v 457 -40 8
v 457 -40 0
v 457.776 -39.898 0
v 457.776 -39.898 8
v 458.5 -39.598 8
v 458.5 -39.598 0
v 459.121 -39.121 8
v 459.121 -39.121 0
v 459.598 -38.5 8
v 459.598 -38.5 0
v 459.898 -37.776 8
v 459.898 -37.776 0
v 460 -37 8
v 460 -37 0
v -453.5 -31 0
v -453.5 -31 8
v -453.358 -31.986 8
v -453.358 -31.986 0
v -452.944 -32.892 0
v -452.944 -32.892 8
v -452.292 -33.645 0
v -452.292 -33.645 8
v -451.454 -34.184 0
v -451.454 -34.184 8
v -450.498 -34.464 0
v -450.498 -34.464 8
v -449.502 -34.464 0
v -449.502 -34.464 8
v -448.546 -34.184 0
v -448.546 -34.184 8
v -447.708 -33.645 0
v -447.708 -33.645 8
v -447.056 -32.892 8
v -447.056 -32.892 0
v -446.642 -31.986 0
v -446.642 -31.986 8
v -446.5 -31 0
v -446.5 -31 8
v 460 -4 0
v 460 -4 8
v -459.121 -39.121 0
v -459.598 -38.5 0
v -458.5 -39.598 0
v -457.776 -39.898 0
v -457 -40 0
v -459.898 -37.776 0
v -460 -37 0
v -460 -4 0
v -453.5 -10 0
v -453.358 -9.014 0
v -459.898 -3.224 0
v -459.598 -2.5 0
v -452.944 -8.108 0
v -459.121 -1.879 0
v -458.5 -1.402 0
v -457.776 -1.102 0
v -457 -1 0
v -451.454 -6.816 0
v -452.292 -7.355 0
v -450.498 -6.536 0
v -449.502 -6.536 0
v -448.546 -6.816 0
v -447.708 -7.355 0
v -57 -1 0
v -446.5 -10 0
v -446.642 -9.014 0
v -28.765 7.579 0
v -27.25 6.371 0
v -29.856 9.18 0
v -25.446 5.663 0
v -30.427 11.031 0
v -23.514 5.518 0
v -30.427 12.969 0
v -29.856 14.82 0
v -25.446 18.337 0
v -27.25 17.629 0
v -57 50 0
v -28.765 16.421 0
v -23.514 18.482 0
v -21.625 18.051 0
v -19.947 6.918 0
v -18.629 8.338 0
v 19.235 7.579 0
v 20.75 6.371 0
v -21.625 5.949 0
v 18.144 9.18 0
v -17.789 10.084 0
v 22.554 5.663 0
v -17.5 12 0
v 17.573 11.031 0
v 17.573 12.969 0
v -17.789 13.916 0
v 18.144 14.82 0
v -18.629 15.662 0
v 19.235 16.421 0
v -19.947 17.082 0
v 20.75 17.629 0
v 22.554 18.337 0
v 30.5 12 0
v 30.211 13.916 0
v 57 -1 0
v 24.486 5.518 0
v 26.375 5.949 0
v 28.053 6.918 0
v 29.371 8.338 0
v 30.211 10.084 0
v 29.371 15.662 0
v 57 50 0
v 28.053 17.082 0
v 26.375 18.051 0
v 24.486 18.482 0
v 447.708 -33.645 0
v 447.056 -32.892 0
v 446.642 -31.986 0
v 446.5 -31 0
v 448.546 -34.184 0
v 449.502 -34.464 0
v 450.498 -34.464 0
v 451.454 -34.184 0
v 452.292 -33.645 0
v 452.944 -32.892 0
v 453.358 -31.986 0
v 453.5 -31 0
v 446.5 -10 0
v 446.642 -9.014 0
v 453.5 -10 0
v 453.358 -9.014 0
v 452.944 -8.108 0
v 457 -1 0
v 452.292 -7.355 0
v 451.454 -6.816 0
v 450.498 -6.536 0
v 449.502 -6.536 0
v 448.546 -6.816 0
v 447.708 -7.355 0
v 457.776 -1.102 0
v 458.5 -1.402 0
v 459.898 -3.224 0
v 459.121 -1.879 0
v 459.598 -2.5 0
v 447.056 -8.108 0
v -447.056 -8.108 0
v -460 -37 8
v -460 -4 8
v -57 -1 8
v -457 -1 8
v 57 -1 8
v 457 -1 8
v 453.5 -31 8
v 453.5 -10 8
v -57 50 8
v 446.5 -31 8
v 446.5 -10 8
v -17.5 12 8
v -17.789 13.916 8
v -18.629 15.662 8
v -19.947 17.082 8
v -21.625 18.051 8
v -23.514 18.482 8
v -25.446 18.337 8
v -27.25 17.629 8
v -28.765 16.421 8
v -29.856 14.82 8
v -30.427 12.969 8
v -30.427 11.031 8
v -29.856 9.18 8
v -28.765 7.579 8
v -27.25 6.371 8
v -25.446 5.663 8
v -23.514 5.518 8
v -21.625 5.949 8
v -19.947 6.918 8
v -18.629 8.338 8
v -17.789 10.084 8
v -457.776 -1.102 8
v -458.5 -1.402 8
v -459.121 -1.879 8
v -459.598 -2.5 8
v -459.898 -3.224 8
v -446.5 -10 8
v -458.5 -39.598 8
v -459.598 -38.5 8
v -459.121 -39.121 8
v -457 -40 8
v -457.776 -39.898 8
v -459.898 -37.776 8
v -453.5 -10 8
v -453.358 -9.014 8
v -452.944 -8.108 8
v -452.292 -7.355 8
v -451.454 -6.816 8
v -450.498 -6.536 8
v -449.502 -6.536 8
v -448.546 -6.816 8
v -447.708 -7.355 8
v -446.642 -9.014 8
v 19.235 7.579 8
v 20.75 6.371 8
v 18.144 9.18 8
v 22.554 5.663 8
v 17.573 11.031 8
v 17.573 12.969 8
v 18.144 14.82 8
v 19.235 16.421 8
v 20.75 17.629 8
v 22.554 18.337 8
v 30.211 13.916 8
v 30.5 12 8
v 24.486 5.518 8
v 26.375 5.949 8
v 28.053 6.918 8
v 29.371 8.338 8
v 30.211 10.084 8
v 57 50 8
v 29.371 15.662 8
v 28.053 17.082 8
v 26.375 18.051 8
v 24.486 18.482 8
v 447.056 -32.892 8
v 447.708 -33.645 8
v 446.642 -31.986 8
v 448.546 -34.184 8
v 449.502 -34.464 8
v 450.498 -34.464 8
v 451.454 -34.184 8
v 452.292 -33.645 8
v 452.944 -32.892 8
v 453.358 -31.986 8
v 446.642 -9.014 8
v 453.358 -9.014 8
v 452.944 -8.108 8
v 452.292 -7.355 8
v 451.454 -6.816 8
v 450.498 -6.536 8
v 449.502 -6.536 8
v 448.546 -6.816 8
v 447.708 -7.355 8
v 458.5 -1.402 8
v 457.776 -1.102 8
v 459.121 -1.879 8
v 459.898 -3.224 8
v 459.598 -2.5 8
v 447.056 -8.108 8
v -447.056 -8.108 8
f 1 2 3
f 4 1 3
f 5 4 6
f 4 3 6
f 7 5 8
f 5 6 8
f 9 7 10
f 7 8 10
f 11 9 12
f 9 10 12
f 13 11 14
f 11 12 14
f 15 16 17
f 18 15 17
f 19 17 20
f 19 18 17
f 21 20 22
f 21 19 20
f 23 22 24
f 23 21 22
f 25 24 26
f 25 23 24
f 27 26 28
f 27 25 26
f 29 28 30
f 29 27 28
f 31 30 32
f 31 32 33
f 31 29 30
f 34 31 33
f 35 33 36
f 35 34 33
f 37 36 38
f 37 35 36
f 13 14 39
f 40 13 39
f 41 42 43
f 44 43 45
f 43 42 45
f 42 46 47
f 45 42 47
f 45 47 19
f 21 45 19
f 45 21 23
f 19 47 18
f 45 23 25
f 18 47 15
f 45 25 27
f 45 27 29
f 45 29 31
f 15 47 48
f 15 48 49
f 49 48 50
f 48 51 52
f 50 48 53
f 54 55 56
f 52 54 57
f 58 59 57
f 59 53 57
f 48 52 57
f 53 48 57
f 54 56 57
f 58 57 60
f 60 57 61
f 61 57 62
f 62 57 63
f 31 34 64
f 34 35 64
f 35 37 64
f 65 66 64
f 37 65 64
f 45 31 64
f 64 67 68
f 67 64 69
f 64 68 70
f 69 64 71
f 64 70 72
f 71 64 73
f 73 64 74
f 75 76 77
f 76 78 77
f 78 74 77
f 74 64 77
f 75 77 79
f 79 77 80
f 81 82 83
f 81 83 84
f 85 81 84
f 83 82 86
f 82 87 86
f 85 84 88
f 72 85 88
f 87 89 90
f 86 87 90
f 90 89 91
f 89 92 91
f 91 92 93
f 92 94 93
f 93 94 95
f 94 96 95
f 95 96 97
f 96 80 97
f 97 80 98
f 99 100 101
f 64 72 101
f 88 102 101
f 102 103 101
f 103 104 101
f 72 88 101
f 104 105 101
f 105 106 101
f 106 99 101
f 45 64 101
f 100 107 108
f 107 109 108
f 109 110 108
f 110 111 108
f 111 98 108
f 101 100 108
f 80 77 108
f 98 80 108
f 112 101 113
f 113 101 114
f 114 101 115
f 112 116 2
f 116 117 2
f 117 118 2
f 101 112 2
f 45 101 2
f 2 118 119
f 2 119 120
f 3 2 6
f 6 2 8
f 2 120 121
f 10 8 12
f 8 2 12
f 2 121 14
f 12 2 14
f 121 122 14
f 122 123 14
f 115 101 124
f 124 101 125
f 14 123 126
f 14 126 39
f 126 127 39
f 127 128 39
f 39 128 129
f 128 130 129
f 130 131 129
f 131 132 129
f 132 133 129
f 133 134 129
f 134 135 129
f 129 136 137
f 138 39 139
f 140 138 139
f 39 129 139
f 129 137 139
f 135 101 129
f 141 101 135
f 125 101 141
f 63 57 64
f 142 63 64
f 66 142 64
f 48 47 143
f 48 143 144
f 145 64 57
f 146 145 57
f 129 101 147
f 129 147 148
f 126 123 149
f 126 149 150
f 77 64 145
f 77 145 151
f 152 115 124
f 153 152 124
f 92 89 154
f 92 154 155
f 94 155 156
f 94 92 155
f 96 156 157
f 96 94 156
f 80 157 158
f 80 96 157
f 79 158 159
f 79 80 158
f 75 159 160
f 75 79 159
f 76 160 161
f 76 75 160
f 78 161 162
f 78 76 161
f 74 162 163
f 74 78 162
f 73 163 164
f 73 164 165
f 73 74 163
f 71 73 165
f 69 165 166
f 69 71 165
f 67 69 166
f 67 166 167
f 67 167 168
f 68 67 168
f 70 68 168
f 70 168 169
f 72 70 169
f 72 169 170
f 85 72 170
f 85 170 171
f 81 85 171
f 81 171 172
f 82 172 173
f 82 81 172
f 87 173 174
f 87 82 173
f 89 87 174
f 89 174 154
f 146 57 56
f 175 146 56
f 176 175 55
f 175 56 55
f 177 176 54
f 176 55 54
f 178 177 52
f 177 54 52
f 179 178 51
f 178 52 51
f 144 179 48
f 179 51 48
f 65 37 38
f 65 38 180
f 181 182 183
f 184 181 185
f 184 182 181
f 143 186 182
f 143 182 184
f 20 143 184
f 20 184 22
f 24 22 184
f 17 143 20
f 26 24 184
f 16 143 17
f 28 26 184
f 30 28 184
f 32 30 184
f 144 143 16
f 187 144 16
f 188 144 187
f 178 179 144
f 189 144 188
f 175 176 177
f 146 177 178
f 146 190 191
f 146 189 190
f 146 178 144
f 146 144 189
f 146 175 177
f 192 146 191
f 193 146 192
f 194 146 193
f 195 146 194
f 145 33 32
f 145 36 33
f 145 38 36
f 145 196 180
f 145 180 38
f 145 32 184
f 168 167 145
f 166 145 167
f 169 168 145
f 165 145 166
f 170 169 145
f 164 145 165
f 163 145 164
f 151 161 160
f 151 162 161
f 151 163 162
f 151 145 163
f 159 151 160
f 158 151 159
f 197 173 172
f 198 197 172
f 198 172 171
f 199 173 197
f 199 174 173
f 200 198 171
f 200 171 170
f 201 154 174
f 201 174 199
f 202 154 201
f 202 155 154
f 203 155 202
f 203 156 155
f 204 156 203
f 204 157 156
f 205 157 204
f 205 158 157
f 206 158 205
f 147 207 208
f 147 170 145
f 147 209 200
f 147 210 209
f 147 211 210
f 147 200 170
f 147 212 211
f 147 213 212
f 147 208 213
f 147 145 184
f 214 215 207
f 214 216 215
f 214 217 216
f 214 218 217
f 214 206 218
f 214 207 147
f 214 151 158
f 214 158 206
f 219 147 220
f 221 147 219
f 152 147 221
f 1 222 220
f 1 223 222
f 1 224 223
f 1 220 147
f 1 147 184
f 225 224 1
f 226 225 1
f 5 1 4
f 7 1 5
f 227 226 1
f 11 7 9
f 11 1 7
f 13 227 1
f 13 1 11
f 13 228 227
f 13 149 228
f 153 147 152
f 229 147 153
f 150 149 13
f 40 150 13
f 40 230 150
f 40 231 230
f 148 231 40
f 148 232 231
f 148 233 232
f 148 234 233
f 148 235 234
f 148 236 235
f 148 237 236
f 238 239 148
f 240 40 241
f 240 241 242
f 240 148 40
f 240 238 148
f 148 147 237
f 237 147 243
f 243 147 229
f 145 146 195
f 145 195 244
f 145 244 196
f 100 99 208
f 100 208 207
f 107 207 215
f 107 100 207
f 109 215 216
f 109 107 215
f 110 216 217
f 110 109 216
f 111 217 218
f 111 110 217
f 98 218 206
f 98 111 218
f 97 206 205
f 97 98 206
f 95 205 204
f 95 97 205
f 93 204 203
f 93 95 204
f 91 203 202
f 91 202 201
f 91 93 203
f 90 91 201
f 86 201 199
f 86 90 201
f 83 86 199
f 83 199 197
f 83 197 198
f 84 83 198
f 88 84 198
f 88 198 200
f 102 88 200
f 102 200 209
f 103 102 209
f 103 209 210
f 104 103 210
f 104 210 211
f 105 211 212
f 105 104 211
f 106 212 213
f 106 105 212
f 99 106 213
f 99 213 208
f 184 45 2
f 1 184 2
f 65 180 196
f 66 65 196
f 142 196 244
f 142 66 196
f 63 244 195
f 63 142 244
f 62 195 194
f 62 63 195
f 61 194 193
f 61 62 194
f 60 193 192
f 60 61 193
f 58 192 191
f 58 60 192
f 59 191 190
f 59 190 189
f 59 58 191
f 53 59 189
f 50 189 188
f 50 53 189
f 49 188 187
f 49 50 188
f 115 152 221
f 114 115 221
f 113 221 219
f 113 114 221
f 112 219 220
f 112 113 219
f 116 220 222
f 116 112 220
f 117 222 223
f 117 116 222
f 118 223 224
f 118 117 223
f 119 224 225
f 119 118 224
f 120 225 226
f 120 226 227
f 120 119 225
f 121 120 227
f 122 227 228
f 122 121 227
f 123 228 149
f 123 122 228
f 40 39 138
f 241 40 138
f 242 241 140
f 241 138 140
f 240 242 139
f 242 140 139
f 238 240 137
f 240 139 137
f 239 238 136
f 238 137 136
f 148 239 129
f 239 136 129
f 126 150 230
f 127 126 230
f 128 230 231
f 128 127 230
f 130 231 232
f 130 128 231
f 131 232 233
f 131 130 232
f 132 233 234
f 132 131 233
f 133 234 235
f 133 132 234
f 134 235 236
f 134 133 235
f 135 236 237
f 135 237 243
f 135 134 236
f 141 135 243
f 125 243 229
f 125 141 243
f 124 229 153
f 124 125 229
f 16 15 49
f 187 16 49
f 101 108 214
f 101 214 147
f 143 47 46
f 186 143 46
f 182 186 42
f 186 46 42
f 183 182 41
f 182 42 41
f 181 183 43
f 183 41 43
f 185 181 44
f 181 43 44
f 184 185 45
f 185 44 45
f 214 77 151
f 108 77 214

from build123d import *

# Parameters (mm, degrees)
SKETCH_R  = 6.5
PAD_DEPTH = 8


with BuildPart() as part:
    # Sketch → Pad (new body)
    with BuildSketch(Plane.XY):
        with BuildLine():
            Line((-457, -40), (0, -40))
            Line((0, -40), (457, -40))
            ThreePointArc((457, -40), (459.12132, -39.12132), (460, -37))
            Line((460, -37), (460, -4))
            ThreePointArc((460, -4), (459.12132, -1.87868), (457, -1))
            Line((58, -1), (457, -1))
            Line((57, -1), (58, -1))
            Line((57, 50), (57, -1))
            Line((-57, 50), (57, 50))
            Line((-57, -1), (-57, 50))
            Line((-57, -1), (-58, -1))
            Line((-58, -1), (-457, -1))
            ThreePointArc((-457, -1), (-459.12132, -1.87868), (-460, -4))
            Line((-460, -37), (-460, -4))
            ThreePointArc((-460, -37), (-459.12132, -39.12132), (-457, -40))
        make_face()
        with Locations((-24, 12)):
            Circle(SKETCH_R, mode=Mode.SUBTRACT)
        with Locations((24, 12)):
            Circle(SKETCH_R, mode=Mode.SUBTRACT)
        with BuildLine():
            ThreePointArc((-453.5, -31), (-450, -34.5), (-446.5, -31))
            Line((-446.5, -31), (-446.5, -10))
            ThreePointArc((-446.5, -10), (-450, -6.5), (-453.5, -10))
            Line((-453.5, -31), (-453.5, -10))
        make_face(mode=Mode.SUBTRACT)
        with BuildLine():
            ThreePointArc((446.5, -31), (450, -34.5), (453.5, -31))
            Line((453.5, -31), (453.5, -10))
            ThreePointArc((453.5, -10), (450, -6.5), (446.5, -10))
            Line((446.5, -31), (446.5, -10))
        make_face(mode=Mode.SUBTRACT)
    extrude(amount=PAD_DEPTH)


solid = part.part
